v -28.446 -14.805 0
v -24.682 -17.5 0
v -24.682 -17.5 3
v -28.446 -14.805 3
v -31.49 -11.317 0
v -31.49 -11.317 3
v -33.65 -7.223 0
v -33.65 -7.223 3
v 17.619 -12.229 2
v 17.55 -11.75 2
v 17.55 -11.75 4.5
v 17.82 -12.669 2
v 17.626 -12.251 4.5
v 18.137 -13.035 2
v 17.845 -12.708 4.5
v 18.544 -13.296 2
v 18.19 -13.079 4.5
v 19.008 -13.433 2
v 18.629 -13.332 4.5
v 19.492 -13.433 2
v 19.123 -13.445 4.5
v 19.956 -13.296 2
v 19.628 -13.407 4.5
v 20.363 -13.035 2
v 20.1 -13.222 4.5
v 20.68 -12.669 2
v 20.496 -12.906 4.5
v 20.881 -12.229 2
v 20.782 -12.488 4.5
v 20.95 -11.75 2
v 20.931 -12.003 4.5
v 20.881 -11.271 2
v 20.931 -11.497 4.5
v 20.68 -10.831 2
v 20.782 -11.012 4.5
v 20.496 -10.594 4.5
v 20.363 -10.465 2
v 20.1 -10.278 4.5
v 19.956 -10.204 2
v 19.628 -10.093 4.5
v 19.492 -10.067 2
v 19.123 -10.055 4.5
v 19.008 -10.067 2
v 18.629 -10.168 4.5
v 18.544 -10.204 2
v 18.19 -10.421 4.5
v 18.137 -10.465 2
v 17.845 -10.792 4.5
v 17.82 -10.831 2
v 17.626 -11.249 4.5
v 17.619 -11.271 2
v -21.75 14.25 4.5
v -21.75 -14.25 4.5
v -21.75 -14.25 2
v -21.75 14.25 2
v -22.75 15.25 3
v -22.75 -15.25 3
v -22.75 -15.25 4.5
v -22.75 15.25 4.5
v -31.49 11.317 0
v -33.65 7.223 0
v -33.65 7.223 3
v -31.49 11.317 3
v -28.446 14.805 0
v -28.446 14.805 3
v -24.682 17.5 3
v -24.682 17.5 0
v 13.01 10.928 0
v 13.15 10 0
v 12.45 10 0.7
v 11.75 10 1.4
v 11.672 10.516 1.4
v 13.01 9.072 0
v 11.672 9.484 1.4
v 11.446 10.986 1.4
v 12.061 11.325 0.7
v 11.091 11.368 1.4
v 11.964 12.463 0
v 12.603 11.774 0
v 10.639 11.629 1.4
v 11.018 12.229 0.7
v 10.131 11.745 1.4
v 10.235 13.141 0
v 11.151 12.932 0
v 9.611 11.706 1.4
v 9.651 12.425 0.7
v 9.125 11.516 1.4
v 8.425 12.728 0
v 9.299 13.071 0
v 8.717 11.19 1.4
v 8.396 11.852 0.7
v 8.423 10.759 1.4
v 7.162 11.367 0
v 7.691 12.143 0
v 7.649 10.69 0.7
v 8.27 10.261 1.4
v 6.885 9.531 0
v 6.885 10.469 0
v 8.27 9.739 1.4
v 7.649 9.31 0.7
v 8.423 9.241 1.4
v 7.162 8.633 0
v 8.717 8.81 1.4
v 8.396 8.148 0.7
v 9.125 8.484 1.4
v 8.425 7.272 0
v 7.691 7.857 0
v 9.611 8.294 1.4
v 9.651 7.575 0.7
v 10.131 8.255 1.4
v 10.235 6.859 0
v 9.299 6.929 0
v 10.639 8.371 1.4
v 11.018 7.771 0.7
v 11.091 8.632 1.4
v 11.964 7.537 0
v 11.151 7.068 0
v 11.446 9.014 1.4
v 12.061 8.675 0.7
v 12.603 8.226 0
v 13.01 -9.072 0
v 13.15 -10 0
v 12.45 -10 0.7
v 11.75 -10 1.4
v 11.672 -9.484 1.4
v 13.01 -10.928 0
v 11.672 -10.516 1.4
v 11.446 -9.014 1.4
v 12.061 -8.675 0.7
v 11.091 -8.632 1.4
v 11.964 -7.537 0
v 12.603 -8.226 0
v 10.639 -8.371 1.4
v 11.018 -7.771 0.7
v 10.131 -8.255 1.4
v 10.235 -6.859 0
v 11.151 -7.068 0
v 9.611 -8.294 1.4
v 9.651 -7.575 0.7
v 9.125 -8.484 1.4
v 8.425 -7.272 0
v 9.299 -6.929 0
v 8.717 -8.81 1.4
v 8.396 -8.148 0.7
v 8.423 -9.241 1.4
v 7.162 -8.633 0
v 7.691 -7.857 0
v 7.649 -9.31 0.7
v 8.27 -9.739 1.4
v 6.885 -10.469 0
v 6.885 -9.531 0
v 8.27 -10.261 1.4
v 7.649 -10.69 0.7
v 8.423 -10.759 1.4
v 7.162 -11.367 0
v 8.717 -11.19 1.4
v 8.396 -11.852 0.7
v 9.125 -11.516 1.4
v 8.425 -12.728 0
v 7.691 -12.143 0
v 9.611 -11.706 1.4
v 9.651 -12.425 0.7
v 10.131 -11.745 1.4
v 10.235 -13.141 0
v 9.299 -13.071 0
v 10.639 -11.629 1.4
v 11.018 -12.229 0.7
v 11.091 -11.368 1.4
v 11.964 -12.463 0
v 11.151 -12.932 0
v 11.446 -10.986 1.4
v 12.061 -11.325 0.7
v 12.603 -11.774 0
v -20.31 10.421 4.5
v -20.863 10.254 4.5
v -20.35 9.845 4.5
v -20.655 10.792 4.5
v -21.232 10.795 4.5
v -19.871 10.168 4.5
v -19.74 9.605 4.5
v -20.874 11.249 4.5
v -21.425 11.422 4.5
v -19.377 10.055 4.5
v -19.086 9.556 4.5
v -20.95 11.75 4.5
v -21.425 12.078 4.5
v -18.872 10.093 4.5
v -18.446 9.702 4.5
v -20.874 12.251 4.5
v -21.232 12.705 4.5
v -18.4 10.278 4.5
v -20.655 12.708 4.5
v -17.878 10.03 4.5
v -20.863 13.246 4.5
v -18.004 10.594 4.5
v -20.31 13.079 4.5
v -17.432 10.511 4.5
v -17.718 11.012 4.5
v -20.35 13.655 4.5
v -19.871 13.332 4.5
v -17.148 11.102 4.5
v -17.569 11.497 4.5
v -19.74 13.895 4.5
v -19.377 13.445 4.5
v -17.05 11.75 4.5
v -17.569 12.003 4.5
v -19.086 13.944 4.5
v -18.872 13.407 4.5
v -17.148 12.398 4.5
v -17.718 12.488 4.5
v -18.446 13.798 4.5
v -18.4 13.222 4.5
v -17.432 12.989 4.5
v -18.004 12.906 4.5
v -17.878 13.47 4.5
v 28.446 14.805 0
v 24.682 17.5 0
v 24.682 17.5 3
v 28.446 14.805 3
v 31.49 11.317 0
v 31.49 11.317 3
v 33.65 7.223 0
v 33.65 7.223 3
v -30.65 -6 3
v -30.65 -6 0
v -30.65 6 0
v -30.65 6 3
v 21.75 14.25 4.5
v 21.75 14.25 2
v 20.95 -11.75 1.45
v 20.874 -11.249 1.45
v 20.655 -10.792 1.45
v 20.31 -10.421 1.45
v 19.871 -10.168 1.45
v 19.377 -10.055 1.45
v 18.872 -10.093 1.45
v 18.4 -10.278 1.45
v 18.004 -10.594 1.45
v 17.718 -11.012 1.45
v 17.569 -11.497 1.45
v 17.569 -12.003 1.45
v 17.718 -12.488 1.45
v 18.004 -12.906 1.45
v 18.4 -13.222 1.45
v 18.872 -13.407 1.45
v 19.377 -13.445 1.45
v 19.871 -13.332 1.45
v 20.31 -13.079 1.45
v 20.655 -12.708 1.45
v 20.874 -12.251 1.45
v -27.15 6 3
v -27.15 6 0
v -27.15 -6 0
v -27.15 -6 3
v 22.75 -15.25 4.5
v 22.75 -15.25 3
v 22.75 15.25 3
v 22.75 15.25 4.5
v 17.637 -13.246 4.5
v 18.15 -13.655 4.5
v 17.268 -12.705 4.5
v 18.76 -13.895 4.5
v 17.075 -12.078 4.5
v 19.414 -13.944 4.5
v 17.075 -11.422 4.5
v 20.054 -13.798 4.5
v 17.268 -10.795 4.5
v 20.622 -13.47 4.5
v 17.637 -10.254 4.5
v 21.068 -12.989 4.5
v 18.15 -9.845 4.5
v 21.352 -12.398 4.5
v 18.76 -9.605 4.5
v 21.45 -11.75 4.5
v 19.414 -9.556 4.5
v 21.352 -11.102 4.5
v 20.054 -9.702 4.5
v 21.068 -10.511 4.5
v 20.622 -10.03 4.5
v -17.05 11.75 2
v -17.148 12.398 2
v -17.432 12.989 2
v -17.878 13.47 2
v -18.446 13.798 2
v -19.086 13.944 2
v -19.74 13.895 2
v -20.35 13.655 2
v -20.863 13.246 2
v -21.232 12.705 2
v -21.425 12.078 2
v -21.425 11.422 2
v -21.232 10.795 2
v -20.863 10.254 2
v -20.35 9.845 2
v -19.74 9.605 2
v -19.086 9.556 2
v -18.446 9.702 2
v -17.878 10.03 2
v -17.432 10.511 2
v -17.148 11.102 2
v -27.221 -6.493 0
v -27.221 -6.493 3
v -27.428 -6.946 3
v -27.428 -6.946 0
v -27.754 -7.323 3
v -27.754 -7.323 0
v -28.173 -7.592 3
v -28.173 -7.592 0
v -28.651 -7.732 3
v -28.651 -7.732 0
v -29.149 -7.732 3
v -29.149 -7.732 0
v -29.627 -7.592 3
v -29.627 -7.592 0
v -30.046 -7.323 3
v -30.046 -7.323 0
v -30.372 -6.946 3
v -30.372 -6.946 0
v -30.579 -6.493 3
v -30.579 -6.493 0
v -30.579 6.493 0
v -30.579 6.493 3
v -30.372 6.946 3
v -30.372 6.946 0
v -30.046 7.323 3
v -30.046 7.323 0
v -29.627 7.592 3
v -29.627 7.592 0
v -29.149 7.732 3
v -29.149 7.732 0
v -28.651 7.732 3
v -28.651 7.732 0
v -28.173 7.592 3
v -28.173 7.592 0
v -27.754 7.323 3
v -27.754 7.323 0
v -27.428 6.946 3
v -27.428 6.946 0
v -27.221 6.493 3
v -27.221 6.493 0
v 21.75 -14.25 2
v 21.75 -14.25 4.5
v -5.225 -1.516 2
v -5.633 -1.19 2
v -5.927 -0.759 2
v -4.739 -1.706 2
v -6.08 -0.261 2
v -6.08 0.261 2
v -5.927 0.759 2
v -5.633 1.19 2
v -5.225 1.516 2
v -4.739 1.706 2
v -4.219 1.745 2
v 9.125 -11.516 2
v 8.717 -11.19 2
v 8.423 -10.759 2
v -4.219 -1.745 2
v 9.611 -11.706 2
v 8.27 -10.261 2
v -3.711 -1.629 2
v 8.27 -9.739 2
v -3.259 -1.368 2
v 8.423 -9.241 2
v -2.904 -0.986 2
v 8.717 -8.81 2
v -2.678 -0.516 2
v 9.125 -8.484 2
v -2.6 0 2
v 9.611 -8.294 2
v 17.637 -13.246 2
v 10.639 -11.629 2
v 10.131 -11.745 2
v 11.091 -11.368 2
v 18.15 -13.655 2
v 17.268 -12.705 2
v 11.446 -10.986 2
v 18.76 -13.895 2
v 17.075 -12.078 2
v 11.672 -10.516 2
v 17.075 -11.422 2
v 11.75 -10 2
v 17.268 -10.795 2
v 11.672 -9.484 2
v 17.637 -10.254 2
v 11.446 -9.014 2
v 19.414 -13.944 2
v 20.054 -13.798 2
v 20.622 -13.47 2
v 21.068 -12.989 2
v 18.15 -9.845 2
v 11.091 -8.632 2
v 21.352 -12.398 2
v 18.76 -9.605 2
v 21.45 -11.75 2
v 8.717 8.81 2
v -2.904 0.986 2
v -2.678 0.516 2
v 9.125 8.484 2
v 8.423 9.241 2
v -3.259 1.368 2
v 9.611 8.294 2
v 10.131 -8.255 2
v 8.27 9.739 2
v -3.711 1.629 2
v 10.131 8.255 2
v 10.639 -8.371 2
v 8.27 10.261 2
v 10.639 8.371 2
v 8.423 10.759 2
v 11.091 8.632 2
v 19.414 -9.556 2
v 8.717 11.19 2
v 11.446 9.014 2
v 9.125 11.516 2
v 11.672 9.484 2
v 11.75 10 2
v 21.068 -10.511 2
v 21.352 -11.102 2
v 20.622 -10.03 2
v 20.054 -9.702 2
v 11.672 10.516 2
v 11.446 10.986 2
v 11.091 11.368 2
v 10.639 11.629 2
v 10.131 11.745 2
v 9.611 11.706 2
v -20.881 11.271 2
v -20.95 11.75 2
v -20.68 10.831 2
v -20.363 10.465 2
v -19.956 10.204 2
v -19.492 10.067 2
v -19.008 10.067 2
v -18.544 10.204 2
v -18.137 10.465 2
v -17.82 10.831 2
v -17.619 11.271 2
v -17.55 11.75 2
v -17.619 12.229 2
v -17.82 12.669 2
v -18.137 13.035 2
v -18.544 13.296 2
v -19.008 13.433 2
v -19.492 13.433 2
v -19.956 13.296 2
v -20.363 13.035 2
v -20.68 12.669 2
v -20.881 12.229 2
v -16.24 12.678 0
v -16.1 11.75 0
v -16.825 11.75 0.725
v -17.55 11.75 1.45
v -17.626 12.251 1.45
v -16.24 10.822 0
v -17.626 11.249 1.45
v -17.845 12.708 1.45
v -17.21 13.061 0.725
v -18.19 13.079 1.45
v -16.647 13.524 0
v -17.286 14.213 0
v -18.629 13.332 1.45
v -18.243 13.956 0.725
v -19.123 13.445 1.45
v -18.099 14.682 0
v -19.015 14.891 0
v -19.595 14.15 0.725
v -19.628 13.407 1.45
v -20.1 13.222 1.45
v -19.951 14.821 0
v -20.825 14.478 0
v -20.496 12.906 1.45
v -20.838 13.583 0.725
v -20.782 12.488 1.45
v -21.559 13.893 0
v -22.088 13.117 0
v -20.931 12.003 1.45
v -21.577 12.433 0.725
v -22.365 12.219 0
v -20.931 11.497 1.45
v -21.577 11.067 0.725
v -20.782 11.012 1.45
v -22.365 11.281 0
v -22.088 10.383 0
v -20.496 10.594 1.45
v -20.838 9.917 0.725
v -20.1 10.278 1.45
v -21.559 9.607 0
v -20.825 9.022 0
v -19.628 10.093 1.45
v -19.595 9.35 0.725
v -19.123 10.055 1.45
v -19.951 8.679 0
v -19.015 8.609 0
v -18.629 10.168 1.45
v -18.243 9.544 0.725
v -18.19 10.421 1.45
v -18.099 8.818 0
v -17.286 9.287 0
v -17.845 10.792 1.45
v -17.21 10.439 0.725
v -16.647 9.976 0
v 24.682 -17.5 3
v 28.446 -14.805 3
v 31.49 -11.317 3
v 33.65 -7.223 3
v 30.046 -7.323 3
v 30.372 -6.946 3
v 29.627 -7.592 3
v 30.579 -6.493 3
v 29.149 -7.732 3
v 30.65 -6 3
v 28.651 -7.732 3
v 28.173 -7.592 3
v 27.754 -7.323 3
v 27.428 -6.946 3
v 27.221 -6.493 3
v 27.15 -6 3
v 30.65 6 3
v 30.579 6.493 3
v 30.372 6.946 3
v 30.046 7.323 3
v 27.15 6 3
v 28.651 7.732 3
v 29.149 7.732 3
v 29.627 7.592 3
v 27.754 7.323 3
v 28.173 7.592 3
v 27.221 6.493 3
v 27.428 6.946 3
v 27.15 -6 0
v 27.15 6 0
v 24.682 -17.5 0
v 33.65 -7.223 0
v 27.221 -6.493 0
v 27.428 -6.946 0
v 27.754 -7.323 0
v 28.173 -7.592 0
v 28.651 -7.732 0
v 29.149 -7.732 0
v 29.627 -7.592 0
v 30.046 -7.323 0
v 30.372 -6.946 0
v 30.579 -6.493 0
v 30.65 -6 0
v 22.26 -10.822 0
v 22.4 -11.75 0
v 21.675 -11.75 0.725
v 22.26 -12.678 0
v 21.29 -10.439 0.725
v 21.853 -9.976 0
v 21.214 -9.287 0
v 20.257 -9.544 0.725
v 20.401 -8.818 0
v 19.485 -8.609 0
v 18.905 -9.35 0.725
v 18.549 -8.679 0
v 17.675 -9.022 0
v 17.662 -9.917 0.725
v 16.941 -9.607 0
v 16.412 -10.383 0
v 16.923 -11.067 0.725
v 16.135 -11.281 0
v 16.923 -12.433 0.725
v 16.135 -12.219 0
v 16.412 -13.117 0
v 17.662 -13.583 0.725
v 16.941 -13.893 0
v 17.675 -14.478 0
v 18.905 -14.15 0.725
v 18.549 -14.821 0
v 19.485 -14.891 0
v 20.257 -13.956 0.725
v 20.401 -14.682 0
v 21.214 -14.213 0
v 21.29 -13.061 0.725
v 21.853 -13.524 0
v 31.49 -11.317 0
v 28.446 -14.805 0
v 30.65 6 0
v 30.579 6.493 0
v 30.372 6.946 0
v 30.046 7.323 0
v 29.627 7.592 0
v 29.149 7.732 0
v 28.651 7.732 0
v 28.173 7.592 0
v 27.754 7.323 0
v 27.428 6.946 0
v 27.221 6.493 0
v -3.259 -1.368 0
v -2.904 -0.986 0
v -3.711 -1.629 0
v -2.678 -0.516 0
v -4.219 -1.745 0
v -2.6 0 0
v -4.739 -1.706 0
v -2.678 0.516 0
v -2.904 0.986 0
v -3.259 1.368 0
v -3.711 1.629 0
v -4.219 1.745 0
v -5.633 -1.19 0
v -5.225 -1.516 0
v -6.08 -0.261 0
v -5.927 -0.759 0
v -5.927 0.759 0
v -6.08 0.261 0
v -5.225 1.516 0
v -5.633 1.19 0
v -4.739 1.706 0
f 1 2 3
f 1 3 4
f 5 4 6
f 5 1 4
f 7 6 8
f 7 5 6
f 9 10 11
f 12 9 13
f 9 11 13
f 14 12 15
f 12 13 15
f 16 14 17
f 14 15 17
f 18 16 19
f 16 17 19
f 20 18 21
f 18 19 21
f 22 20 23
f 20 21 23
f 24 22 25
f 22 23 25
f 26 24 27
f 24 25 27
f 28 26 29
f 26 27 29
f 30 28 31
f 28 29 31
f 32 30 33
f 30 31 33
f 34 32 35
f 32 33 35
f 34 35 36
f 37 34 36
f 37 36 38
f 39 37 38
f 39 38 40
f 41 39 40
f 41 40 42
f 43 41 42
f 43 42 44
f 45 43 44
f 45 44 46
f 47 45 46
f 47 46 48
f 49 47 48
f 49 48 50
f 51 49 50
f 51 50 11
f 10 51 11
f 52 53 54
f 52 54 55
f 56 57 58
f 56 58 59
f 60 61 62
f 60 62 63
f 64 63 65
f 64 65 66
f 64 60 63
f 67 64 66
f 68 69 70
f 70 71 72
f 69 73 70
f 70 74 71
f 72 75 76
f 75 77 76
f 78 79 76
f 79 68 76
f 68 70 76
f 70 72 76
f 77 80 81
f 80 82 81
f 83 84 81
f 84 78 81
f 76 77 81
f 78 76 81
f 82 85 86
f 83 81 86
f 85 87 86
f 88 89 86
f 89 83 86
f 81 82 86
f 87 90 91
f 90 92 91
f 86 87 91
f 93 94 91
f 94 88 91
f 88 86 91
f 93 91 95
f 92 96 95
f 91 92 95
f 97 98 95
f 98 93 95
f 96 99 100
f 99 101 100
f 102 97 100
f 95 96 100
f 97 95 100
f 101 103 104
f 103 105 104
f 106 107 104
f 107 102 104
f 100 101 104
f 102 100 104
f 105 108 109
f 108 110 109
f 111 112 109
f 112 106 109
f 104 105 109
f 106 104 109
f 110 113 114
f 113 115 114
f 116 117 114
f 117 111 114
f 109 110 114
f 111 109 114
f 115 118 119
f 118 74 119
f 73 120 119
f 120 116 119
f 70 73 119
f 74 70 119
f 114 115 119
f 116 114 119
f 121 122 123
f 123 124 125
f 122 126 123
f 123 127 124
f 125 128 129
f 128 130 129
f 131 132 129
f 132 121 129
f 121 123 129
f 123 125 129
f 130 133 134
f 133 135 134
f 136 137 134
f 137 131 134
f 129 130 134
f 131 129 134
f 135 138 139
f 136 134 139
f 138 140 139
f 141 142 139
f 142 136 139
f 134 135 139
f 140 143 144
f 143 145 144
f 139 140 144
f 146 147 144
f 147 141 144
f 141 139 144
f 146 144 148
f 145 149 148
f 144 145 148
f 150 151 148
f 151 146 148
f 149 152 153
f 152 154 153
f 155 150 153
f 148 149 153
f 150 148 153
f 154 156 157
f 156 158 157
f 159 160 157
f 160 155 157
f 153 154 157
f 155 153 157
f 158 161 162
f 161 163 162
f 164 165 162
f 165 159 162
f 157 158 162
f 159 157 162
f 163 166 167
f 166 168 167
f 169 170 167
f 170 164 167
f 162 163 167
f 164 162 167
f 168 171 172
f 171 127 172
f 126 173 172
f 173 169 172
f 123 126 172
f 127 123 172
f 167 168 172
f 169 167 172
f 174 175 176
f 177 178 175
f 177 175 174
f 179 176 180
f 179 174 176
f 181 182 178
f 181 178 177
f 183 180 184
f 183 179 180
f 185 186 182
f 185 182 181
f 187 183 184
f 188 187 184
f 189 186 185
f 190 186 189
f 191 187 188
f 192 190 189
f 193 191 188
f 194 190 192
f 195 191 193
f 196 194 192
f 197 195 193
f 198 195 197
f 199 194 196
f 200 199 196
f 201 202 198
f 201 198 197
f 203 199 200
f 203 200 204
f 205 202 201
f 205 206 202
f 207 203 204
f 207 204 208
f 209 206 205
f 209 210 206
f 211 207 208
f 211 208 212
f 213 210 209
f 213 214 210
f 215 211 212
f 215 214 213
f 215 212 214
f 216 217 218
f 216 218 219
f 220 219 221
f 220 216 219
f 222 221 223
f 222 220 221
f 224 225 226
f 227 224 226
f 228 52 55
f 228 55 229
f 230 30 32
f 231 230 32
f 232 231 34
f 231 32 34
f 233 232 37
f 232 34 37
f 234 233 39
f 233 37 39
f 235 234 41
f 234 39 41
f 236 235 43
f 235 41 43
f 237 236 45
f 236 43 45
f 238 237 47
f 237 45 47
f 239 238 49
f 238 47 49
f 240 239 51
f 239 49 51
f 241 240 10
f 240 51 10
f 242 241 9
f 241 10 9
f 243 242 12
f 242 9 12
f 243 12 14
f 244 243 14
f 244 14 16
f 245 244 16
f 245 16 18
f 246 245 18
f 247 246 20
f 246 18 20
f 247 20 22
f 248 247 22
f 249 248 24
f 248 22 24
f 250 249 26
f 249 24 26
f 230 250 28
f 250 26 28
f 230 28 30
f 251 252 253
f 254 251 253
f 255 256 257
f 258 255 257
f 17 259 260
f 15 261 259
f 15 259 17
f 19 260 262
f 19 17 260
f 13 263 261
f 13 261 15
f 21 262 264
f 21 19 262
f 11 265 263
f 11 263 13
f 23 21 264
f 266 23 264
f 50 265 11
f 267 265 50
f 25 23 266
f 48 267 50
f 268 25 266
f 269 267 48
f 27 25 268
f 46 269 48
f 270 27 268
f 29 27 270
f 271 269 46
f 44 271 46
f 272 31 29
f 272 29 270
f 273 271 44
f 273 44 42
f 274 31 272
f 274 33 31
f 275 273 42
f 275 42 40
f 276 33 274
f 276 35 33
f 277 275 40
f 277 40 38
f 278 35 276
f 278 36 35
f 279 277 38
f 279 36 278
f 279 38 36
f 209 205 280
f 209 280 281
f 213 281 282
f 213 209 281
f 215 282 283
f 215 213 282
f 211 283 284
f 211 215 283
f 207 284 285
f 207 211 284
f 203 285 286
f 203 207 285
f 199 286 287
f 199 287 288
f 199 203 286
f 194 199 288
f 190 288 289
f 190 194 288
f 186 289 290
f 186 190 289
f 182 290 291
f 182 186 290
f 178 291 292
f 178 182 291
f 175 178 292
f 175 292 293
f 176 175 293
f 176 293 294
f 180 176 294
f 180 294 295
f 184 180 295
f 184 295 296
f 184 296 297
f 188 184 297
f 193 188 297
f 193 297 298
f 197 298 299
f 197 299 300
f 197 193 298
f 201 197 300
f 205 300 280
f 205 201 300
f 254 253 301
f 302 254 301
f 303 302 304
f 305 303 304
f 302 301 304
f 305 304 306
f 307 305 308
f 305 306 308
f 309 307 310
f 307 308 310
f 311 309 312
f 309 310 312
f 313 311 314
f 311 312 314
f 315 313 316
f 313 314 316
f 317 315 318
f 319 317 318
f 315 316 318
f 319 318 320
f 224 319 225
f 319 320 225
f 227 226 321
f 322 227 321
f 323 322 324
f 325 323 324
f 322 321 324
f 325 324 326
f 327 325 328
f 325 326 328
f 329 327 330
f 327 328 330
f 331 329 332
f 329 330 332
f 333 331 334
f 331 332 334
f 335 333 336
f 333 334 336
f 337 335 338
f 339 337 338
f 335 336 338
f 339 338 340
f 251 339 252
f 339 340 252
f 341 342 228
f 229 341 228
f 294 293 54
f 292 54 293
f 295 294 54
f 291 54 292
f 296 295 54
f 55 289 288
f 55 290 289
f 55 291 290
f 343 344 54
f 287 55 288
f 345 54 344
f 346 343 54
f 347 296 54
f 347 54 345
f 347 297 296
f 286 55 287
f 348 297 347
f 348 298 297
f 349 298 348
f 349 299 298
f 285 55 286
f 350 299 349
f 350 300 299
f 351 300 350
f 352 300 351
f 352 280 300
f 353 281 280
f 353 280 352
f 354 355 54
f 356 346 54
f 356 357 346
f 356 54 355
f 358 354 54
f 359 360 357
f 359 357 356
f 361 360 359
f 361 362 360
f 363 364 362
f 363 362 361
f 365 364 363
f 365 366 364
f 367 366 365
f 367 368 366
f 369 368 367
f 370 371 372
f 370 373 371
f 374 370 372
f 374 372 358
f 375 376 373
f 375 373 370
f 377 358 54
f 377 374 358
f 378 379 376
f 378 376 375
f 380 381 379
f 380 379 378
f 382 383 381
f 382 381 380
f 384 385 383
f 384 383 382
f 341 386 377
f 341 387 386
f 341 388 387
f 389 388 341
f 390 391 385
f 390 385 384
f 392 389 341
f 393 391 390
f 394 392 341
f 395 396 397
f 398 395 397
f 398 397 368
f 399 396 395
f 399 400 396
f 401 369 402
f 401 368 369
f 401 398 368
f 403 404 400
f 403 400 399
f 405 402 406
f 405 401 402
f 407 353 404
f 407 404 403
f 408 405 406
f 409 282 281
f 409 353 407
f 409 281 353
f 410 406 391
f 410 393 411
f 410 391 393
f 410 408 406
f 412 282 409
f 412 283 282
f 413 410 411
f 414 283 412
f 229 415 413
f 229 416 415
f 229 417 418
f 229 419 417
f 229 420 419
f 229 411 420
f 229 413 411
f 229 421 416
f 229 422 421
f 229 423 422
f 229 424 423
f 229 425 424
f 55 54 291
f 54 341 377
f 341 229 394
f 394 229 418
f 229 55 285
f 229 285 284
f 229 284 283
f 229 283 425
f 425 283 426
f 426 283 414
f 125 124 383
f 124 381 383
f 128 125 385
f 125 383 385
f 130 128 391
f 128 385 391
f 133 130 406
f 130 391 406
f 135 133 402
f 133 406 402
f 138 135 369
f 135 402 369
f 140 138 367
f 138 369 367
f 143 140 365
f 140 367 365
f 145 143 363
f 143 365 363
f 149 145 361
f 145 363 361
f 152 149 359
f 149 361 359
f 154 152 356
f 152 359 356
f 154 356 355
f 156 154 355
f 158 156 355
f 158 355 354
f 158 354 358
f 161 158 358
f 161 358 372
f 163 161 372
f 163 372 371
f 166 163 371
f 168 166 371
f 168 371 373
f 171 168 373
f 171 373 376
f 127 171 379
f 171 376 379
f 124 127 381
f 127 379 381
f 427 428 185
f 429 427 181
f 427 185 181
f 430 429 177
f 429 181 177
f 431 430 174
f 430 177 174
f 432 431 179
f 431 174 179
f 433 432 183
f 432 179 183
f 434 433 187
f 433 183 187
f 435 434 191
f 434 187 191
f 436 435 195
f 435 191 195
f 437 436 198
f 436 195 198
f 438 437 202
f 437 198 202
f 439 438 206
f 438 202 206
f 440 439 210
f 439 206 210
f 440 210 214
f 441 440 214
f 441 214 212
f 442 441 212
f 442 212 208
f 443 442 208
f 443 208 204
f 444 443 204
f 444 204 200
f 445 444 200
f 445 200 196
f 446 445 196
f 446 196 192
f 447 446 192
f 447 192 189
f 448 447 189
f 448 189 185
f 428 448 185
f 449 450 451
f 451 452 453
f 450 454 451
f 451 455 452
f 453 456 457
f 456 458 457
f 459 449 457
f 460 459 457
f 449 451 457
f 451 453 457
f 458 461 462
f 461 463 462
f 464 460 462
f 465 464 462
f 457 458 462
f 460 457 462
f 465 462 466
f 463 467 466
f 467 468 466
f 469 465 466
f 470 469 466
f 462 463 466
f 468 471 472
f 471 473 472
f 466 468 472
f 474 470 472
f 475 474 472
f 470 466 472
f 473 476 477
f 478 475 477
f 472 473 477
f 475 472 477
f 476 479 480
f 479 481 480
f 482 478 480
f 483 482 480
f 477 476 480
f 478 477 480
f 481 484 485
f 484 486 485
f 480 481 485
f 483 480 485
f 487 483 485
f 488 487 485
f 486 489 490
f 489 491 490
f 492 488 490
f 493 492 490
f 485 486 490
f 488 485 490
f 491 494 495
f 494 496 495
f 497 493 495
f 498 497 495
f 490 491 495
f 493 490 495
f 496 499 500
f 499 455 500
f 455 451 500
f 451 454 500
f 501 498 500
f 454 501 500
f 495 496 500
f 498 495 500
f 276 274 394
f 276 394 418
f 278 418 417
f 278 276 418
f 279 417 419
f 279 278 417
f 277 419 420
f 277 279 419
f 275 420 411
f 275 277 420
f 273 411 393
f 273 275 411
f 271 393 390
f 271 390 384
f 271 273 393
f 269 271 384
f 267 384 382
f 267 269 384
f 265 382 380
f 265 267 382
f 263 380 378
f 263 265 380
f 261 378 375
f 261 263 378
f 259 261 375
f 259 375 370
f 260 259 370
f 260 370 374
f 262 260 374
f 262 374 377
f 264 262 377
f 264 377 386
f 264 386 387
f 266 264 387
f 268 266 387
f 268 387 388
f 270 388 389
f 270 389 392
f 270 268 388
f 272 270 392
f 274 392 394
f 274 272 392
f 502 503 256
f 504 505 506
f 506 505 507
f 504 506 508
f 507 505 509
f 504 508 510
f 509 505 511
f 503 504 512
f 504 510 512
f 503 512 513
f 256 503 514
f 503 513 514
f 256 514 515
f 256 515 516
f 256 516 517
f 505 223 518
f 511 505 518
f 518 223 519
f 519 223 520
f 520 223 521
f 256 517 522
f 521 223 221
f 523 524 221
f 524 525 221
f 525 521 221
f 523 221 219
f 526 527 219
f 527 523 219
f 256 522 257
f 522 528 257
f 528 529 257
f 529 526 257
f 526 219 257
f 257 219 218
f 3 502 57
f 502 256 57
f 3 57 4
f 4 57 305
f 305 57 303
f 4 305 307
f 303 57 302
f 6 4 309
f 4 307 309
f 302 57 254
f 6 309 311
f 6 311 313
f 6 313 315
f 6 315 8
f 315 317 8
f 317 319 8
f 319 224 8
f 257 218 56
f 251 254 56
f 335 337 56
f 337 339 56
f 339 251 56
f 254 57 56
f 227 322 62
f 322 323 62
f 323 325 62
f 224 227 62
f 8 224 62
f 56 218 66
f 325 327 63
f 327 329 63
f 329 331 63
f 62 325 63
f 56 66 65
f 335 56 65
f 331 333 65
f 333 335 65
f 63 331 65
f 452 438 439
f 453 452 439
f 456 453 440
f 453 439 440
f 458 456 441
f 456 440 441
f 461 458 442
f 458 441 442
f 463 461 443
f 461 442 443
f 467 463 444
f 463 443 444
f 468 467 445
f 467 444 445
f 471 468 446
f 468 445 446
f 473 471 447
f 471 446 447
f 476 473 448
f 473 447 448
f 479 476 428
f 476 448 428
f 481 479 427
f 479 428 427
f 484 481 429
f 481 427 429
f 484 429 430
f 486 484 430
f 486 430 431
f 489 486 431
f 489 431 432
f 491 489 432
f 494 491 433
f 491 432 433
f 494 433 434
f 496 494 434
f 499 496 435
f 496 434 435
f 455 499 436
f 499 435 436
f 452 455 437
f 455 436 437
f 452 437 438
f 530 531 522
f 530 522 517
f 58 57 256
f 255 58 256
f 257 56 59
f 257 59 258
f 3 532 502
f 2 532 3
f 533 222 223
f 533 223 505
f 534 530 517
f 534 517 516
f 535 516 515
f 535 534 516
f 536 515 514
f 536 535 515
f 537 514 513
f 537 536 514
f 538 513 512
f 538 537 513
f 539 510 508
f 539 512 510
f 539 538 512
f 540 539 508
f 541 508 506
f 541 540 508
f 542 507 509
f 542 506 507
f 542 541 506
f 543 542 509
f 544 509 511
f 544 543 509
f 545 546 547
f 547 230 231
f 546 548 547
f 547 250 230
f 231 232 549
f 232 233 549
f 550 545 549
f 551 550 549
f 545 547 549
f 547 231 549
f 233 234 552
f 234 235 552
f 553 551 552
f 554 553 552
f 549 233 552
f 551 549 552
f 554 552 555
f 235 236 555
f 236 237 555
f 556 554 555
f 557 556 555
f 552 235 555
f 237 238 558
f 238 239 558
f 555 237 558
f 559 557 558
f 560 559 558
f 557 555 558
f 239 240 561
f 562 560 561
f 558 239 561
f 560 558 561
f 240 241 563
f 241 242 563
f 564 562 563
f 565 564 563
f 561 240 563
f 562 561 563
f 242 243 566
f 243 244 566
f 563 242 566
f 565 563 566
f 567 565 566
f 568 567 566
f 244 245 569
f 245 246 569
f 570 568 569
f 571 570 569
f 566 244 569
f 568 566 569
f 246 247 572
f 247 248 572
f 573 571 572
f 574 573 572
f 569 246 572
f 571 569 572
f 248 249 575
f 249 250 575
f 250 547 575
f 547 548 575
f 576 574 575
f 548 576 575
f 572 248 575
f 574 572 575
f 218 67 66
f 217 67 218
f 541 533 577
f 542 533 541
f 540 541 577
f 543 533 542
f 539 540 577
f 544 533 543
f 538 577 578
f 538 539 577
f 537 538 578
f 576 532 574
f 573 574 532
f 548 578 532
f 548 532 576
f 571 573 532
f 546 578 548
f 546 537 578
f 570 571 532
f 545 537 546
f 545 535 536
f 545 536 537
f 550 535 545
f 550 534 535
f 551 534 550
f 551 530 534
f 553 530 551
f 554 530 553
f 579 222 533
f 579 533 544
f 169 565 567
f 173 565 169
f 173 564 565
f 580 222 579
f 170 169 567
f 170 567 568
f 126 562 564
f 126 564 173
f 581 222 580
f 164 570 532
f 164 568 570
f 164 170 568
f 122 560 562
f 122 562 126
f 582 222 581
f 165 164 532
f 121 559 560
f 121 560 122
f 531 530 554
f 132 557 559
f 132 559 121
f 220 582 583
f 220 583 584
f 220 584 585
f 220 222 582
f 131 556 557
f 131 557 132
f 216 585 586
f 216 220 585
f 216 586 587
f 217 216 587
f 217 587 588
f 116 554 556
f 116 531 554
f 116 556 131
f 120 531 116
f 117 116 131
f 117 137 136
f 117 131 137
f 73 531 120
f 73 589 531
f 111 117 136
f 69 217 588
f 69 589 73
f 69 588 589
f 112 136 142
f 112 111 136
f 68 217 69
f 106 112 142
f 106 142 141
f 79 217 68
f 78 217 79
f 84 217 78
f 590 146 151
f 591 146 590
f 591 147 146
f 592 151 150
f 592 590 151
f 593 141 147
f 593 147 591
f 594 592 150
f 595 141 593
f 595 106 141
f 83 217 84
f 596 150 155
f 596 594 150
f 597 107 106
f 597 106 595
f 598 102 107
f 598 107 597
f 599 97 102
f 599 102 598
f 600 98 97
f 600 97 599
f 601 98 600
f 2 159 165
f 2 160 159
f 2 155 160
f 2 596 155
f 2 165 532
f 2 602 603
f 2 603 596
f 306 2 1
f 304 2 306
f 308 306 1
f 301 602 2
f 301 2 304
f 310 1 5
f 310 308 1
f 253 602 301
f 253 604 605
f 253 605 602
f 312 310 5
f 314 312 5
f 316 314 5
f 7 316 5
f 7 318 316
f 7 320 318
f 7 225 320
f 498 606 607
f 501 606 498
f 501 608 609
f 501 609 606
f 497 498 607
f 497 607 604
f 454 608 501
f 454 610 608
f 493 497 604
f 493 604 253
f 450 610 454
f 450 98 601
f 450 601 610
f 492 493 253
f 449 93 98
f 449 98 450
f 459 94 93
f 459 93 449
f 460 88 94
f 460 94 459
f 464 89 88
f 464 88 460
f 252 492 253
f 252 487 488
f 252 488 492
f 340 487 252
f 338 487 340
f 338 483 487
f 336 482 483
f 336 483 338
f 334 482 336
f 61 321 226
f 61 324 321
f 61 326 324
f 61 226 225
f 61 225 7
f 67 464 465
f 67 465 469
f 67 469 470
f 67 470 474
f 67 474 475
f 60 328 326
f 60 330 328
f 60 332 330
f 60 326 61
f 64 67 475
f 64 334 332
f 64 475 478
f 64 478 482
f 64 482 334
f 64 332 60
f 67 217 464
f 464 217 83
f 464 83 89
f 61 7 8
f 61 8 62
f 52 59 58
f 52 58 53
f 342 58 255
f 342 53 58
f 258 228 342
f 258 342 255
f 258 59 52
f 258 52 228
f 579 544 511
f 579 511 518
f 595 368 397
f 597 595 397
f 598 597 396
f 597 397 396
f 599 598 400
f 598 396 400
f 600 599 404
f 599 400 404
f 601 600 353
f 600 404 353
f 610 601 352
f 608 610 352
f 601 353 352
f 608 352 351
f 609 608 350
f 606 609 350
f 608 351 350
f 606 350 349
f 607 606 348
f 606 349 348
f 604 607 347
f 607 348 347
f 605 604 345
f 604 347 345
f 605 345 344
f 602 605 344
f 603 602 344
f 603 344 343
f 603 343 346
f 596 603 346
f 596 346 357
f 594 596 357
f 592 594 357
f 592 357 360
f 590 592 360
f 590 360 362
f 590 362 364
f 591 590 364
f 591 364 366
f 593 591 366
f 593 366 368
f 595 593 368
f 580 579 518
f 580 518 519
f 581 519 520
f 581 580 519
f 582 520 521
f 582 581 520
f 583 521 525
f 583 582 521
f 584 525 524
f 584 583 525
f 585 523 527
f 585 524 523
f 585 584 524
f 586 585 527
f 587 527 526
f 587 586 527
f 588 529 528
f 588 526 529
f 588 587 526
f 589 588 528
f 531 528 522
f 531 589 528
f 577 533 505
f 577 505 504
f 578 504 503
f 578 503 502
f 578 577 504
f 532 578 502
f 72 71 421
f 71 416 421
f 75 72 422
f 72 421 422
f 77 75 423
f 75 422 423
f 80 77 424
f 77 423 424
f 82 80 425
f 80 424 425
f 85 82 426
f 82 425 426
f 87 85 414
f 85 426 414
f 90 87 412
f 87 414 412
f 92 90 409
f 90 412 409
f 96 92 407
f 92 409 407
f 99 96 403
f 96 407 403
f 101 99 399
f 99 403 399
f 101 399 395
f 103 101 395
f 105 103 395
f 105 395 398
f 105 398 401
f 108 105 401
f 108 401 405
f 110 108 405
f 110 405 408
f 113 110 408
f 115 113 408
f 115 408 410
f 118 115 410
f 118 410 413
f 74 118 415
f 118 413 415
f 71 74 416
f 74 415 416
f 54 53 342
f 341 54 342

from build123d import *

# Parameters (mm, degrees)
BOSS_EXTRU_1_DEPTH                             = 3
ESQUISSE2_W                                    = 45.5
ESQUISSE2_H                                    = 30.5
BOSS_EXTRU_2_DEPTH                             = 1.5
ESQUISSE3_W                                    = 43.5
ESQUISSE3_H                                    = 28.5
ENL_V_MAT_EXTRU_2_DEPTH                        = 2.5
FRAISAGE_POUR_VIS_T_TE_FRAIS_E_M31_D           = 3.4
FRAISAGE_POUR_VIS_T_TE_FRAIS_E_M31_CSINK_D     = 6.3
FRAISAGE_POUR_VIS_T_TE_FRAIS_E_M31_CSINK_ANGLE = 90
BOSS_EXTRU_3_START                             = 2.5
ESQUISSE6_R                                    = 2.2
ESQUISSE6_R_2                                  = 1.7
BOSS_EXTRU_3_DEPTH                             = 2.5
ENL_V_MAT_EXTRU_3_DEPTH                        = 39.194534949
FRAISAGE_POUR_VIS_T_TE_FRAIS_E_M32_D           = 3.5
FRAISAGE_POUR_VIS_T_TE_FRAIS_E_M32_CSINK_D     = 6.3
FRAISAGE_POUR_VIS_T_TE_FRAIS_E_M32_CSINK_ANGLE = 90
ENL_V_MAT_EXTRU_5_REACH                        = 40.011
ESQUISSE11_R                                   = 1.75


with BuildPart() as part:
    # Esquisse1 → Boss.-Extru.1 (new body)
    with BuildSketch(Plane.XY):
        with BuildLine():
            Line((-24.682458366, 17.5), (24.682458366, 17.5))
            ThreePointArc((24.682458366, 17.5), (30.069312487, 13.149746049), (33.65, 7.223399477))
            Line((33.65, 7.223399477), (33.65, -7.223399477))
            ThreePointArc((33.65, -7.223399477), (30.069312487, -13.149746049), (24.682458366, -17.5))
            Line((24.682458366, -17.5), (-24.682458366, -17.5))
            ThreePointArc((-24.682458366, -17.5), (-30.069312487, -13.149746049), (-33.65, -7.223399477))
            Line((-33.65, -7.223399477), (-33.65, 7.223399477))
            ThreePointArc((-33.65, 7.223399477), (-30.069312487, 13.149746049), (-24.682458366, 17.5))
        make_face()
    extrude(amount=BOSS_EXTRU_1_DEPTH)

    # Esquisse2 → Boss.-Extru.2 (add)
    with BuildSketch(Plane.XY.offset(3)):
        Rectangle(ESQUISSE2_W, ESQUISSE2_H)
    extrude(amount=BOSS_EXTRU_2_DEPTH)

    # Esquisse3 → Enlèv. mat.-Extru.2 (cut)
    with BuildSketch(Plane.XY.offset(4.5)):
        Rectangle(ESQUISSE3_W, ESQUISSE3_H)
    extrude(amount=-ENL_V_MAT_EXTRU_2_DEPTH, mode=Mode.SUBTRACT)

    # Fraisage pour vis à tête fraisée M31 (through all)
    with Locations(Plane(origin=(0, 0, 0), x_dir=(-1, 0, 0), z_dir=(0, 0, -1))):
        with Locations((-19.25, -11.75), (19.25, 11.75)):
            CounterSinkHole(FRAISAGE_POUR_VIS_T_TE_FRAIS_E_M31_D / 2, FRAISAGE_POUR_VIS_T_TE_FRAIS_E_M31_CSINK_D / 2, counter_sink_angle=FRAISAGE_POUR_VIS_T_TE_FRAIS_E_M31_CSINK_ANGLE)

    # Esquisse6 → Boss.-Extru.3 (add)
    # profile 1 of 2: a face of its own
    with BuildSketch(Plane.XY.offset(2).offset(BOSS_EXTRU_3_START)):
        with Locations((-19.25, 11.75)):
            Circle(ESQUISSE6_R)
        with Locations(Location((-19.25, 11.75, 0), (0, 0, 180))):
            Circle(ESQUISSE6_R_2, mode=Mode.SUBTRACT)
    # profile 2 of 2: a face of its own
    with BuildSketch(Plane.XY.offset(2).offset(BOSS_EXTRU_3_START)):
        with Locations((19.25, -11.75)):
            Circle(ESQUISSE6_R)
        with Locations(Location((19.25, -11.75, 0), (0, 0, 180))):
            Circle(ESQUISSE6_R_2, mode=Mode.SUBTRACT)
    extrude(amount=-BOSS_EXTRU_3_DEPTH)

    # Esquisse7 → Enlèv. mat.-Extru.3 (cut, through all)
    with BuildSketch(Plane(origin=(0, 0, 0), x_dir=(-1, 0, 0), z_dir=(0, 0, -1))):
        with BuildLine():
            Line((-27.15, 6), (-27.15, -6))
            ThreePointArc((-27.15, -6), (-28.9, -7.75), (-30.65, -6))
            Line((-30.65, -6), (-30.65, 6))
            ThreePointArc((-30.65, 6), (-28.9, 7.75), (-27.15, 6))
        make_face()
        with BuildLine():
            Line((27.15, 6), (27.15, -6))
            ThreePointArc((27.15, -6), (28.9, -7.75), (30.65, -6))
            Line((30.65, -6), (30.65, 6))
            ThreePointArc((30.65, 6), (28.9, 7.75), (27.15, 6))
        make_face()
    extrude(amount=-ENL_V_MAT_EXTRU_3_DEPTH, mode=Mode.SUBTRACT)

    # Fraisage pour vis à tête fraisée M32 (through all)
    with Locations(Plane(origin=(0, 0, 0), x_dir=(-1, 0, 0), z_dir=(0, 0, -1))):
        with Locations((-10, -10), (-10, 10)):
            CounterSinkHole(FRAISAGE_POUR_VIS_T_TE_FRAIS_E_M32_D / 2, FRAISAGE_POUR_VIS_T_TE_FRAIS_E_M32_CSINK_D / 2, counter_sink_angle=FRAISAGE_POUR_VIS_T_TE_FRAIS_E_M32_CSINK_ANGLE)

    # Esquisse11 → Enlèv. mat.-Extru.5 (cut, up to next)
    with BuildSketch(Plane.XY.offset(2), mode=Mode.PRIVATE) as enl_v_mat_extru_5_sk1:
        with Locations((-4.35, 0)):
            Circle(ESQUISSE11_R)
    enl_v_mat_extru_5_tool1 = extrude(enl_v_mat_extru_5_sk1.sketch, amount=-ENL_V_MAT_EXTRU_5_REACH, mode=Mode.PRIVATE) & part.part
    add(enl_v_mat_extru_5_tool1.solids().sort_by_distance((-4.35, 0, 2))[0], mode=Mode.SUBTRACT)


solid = part.part
